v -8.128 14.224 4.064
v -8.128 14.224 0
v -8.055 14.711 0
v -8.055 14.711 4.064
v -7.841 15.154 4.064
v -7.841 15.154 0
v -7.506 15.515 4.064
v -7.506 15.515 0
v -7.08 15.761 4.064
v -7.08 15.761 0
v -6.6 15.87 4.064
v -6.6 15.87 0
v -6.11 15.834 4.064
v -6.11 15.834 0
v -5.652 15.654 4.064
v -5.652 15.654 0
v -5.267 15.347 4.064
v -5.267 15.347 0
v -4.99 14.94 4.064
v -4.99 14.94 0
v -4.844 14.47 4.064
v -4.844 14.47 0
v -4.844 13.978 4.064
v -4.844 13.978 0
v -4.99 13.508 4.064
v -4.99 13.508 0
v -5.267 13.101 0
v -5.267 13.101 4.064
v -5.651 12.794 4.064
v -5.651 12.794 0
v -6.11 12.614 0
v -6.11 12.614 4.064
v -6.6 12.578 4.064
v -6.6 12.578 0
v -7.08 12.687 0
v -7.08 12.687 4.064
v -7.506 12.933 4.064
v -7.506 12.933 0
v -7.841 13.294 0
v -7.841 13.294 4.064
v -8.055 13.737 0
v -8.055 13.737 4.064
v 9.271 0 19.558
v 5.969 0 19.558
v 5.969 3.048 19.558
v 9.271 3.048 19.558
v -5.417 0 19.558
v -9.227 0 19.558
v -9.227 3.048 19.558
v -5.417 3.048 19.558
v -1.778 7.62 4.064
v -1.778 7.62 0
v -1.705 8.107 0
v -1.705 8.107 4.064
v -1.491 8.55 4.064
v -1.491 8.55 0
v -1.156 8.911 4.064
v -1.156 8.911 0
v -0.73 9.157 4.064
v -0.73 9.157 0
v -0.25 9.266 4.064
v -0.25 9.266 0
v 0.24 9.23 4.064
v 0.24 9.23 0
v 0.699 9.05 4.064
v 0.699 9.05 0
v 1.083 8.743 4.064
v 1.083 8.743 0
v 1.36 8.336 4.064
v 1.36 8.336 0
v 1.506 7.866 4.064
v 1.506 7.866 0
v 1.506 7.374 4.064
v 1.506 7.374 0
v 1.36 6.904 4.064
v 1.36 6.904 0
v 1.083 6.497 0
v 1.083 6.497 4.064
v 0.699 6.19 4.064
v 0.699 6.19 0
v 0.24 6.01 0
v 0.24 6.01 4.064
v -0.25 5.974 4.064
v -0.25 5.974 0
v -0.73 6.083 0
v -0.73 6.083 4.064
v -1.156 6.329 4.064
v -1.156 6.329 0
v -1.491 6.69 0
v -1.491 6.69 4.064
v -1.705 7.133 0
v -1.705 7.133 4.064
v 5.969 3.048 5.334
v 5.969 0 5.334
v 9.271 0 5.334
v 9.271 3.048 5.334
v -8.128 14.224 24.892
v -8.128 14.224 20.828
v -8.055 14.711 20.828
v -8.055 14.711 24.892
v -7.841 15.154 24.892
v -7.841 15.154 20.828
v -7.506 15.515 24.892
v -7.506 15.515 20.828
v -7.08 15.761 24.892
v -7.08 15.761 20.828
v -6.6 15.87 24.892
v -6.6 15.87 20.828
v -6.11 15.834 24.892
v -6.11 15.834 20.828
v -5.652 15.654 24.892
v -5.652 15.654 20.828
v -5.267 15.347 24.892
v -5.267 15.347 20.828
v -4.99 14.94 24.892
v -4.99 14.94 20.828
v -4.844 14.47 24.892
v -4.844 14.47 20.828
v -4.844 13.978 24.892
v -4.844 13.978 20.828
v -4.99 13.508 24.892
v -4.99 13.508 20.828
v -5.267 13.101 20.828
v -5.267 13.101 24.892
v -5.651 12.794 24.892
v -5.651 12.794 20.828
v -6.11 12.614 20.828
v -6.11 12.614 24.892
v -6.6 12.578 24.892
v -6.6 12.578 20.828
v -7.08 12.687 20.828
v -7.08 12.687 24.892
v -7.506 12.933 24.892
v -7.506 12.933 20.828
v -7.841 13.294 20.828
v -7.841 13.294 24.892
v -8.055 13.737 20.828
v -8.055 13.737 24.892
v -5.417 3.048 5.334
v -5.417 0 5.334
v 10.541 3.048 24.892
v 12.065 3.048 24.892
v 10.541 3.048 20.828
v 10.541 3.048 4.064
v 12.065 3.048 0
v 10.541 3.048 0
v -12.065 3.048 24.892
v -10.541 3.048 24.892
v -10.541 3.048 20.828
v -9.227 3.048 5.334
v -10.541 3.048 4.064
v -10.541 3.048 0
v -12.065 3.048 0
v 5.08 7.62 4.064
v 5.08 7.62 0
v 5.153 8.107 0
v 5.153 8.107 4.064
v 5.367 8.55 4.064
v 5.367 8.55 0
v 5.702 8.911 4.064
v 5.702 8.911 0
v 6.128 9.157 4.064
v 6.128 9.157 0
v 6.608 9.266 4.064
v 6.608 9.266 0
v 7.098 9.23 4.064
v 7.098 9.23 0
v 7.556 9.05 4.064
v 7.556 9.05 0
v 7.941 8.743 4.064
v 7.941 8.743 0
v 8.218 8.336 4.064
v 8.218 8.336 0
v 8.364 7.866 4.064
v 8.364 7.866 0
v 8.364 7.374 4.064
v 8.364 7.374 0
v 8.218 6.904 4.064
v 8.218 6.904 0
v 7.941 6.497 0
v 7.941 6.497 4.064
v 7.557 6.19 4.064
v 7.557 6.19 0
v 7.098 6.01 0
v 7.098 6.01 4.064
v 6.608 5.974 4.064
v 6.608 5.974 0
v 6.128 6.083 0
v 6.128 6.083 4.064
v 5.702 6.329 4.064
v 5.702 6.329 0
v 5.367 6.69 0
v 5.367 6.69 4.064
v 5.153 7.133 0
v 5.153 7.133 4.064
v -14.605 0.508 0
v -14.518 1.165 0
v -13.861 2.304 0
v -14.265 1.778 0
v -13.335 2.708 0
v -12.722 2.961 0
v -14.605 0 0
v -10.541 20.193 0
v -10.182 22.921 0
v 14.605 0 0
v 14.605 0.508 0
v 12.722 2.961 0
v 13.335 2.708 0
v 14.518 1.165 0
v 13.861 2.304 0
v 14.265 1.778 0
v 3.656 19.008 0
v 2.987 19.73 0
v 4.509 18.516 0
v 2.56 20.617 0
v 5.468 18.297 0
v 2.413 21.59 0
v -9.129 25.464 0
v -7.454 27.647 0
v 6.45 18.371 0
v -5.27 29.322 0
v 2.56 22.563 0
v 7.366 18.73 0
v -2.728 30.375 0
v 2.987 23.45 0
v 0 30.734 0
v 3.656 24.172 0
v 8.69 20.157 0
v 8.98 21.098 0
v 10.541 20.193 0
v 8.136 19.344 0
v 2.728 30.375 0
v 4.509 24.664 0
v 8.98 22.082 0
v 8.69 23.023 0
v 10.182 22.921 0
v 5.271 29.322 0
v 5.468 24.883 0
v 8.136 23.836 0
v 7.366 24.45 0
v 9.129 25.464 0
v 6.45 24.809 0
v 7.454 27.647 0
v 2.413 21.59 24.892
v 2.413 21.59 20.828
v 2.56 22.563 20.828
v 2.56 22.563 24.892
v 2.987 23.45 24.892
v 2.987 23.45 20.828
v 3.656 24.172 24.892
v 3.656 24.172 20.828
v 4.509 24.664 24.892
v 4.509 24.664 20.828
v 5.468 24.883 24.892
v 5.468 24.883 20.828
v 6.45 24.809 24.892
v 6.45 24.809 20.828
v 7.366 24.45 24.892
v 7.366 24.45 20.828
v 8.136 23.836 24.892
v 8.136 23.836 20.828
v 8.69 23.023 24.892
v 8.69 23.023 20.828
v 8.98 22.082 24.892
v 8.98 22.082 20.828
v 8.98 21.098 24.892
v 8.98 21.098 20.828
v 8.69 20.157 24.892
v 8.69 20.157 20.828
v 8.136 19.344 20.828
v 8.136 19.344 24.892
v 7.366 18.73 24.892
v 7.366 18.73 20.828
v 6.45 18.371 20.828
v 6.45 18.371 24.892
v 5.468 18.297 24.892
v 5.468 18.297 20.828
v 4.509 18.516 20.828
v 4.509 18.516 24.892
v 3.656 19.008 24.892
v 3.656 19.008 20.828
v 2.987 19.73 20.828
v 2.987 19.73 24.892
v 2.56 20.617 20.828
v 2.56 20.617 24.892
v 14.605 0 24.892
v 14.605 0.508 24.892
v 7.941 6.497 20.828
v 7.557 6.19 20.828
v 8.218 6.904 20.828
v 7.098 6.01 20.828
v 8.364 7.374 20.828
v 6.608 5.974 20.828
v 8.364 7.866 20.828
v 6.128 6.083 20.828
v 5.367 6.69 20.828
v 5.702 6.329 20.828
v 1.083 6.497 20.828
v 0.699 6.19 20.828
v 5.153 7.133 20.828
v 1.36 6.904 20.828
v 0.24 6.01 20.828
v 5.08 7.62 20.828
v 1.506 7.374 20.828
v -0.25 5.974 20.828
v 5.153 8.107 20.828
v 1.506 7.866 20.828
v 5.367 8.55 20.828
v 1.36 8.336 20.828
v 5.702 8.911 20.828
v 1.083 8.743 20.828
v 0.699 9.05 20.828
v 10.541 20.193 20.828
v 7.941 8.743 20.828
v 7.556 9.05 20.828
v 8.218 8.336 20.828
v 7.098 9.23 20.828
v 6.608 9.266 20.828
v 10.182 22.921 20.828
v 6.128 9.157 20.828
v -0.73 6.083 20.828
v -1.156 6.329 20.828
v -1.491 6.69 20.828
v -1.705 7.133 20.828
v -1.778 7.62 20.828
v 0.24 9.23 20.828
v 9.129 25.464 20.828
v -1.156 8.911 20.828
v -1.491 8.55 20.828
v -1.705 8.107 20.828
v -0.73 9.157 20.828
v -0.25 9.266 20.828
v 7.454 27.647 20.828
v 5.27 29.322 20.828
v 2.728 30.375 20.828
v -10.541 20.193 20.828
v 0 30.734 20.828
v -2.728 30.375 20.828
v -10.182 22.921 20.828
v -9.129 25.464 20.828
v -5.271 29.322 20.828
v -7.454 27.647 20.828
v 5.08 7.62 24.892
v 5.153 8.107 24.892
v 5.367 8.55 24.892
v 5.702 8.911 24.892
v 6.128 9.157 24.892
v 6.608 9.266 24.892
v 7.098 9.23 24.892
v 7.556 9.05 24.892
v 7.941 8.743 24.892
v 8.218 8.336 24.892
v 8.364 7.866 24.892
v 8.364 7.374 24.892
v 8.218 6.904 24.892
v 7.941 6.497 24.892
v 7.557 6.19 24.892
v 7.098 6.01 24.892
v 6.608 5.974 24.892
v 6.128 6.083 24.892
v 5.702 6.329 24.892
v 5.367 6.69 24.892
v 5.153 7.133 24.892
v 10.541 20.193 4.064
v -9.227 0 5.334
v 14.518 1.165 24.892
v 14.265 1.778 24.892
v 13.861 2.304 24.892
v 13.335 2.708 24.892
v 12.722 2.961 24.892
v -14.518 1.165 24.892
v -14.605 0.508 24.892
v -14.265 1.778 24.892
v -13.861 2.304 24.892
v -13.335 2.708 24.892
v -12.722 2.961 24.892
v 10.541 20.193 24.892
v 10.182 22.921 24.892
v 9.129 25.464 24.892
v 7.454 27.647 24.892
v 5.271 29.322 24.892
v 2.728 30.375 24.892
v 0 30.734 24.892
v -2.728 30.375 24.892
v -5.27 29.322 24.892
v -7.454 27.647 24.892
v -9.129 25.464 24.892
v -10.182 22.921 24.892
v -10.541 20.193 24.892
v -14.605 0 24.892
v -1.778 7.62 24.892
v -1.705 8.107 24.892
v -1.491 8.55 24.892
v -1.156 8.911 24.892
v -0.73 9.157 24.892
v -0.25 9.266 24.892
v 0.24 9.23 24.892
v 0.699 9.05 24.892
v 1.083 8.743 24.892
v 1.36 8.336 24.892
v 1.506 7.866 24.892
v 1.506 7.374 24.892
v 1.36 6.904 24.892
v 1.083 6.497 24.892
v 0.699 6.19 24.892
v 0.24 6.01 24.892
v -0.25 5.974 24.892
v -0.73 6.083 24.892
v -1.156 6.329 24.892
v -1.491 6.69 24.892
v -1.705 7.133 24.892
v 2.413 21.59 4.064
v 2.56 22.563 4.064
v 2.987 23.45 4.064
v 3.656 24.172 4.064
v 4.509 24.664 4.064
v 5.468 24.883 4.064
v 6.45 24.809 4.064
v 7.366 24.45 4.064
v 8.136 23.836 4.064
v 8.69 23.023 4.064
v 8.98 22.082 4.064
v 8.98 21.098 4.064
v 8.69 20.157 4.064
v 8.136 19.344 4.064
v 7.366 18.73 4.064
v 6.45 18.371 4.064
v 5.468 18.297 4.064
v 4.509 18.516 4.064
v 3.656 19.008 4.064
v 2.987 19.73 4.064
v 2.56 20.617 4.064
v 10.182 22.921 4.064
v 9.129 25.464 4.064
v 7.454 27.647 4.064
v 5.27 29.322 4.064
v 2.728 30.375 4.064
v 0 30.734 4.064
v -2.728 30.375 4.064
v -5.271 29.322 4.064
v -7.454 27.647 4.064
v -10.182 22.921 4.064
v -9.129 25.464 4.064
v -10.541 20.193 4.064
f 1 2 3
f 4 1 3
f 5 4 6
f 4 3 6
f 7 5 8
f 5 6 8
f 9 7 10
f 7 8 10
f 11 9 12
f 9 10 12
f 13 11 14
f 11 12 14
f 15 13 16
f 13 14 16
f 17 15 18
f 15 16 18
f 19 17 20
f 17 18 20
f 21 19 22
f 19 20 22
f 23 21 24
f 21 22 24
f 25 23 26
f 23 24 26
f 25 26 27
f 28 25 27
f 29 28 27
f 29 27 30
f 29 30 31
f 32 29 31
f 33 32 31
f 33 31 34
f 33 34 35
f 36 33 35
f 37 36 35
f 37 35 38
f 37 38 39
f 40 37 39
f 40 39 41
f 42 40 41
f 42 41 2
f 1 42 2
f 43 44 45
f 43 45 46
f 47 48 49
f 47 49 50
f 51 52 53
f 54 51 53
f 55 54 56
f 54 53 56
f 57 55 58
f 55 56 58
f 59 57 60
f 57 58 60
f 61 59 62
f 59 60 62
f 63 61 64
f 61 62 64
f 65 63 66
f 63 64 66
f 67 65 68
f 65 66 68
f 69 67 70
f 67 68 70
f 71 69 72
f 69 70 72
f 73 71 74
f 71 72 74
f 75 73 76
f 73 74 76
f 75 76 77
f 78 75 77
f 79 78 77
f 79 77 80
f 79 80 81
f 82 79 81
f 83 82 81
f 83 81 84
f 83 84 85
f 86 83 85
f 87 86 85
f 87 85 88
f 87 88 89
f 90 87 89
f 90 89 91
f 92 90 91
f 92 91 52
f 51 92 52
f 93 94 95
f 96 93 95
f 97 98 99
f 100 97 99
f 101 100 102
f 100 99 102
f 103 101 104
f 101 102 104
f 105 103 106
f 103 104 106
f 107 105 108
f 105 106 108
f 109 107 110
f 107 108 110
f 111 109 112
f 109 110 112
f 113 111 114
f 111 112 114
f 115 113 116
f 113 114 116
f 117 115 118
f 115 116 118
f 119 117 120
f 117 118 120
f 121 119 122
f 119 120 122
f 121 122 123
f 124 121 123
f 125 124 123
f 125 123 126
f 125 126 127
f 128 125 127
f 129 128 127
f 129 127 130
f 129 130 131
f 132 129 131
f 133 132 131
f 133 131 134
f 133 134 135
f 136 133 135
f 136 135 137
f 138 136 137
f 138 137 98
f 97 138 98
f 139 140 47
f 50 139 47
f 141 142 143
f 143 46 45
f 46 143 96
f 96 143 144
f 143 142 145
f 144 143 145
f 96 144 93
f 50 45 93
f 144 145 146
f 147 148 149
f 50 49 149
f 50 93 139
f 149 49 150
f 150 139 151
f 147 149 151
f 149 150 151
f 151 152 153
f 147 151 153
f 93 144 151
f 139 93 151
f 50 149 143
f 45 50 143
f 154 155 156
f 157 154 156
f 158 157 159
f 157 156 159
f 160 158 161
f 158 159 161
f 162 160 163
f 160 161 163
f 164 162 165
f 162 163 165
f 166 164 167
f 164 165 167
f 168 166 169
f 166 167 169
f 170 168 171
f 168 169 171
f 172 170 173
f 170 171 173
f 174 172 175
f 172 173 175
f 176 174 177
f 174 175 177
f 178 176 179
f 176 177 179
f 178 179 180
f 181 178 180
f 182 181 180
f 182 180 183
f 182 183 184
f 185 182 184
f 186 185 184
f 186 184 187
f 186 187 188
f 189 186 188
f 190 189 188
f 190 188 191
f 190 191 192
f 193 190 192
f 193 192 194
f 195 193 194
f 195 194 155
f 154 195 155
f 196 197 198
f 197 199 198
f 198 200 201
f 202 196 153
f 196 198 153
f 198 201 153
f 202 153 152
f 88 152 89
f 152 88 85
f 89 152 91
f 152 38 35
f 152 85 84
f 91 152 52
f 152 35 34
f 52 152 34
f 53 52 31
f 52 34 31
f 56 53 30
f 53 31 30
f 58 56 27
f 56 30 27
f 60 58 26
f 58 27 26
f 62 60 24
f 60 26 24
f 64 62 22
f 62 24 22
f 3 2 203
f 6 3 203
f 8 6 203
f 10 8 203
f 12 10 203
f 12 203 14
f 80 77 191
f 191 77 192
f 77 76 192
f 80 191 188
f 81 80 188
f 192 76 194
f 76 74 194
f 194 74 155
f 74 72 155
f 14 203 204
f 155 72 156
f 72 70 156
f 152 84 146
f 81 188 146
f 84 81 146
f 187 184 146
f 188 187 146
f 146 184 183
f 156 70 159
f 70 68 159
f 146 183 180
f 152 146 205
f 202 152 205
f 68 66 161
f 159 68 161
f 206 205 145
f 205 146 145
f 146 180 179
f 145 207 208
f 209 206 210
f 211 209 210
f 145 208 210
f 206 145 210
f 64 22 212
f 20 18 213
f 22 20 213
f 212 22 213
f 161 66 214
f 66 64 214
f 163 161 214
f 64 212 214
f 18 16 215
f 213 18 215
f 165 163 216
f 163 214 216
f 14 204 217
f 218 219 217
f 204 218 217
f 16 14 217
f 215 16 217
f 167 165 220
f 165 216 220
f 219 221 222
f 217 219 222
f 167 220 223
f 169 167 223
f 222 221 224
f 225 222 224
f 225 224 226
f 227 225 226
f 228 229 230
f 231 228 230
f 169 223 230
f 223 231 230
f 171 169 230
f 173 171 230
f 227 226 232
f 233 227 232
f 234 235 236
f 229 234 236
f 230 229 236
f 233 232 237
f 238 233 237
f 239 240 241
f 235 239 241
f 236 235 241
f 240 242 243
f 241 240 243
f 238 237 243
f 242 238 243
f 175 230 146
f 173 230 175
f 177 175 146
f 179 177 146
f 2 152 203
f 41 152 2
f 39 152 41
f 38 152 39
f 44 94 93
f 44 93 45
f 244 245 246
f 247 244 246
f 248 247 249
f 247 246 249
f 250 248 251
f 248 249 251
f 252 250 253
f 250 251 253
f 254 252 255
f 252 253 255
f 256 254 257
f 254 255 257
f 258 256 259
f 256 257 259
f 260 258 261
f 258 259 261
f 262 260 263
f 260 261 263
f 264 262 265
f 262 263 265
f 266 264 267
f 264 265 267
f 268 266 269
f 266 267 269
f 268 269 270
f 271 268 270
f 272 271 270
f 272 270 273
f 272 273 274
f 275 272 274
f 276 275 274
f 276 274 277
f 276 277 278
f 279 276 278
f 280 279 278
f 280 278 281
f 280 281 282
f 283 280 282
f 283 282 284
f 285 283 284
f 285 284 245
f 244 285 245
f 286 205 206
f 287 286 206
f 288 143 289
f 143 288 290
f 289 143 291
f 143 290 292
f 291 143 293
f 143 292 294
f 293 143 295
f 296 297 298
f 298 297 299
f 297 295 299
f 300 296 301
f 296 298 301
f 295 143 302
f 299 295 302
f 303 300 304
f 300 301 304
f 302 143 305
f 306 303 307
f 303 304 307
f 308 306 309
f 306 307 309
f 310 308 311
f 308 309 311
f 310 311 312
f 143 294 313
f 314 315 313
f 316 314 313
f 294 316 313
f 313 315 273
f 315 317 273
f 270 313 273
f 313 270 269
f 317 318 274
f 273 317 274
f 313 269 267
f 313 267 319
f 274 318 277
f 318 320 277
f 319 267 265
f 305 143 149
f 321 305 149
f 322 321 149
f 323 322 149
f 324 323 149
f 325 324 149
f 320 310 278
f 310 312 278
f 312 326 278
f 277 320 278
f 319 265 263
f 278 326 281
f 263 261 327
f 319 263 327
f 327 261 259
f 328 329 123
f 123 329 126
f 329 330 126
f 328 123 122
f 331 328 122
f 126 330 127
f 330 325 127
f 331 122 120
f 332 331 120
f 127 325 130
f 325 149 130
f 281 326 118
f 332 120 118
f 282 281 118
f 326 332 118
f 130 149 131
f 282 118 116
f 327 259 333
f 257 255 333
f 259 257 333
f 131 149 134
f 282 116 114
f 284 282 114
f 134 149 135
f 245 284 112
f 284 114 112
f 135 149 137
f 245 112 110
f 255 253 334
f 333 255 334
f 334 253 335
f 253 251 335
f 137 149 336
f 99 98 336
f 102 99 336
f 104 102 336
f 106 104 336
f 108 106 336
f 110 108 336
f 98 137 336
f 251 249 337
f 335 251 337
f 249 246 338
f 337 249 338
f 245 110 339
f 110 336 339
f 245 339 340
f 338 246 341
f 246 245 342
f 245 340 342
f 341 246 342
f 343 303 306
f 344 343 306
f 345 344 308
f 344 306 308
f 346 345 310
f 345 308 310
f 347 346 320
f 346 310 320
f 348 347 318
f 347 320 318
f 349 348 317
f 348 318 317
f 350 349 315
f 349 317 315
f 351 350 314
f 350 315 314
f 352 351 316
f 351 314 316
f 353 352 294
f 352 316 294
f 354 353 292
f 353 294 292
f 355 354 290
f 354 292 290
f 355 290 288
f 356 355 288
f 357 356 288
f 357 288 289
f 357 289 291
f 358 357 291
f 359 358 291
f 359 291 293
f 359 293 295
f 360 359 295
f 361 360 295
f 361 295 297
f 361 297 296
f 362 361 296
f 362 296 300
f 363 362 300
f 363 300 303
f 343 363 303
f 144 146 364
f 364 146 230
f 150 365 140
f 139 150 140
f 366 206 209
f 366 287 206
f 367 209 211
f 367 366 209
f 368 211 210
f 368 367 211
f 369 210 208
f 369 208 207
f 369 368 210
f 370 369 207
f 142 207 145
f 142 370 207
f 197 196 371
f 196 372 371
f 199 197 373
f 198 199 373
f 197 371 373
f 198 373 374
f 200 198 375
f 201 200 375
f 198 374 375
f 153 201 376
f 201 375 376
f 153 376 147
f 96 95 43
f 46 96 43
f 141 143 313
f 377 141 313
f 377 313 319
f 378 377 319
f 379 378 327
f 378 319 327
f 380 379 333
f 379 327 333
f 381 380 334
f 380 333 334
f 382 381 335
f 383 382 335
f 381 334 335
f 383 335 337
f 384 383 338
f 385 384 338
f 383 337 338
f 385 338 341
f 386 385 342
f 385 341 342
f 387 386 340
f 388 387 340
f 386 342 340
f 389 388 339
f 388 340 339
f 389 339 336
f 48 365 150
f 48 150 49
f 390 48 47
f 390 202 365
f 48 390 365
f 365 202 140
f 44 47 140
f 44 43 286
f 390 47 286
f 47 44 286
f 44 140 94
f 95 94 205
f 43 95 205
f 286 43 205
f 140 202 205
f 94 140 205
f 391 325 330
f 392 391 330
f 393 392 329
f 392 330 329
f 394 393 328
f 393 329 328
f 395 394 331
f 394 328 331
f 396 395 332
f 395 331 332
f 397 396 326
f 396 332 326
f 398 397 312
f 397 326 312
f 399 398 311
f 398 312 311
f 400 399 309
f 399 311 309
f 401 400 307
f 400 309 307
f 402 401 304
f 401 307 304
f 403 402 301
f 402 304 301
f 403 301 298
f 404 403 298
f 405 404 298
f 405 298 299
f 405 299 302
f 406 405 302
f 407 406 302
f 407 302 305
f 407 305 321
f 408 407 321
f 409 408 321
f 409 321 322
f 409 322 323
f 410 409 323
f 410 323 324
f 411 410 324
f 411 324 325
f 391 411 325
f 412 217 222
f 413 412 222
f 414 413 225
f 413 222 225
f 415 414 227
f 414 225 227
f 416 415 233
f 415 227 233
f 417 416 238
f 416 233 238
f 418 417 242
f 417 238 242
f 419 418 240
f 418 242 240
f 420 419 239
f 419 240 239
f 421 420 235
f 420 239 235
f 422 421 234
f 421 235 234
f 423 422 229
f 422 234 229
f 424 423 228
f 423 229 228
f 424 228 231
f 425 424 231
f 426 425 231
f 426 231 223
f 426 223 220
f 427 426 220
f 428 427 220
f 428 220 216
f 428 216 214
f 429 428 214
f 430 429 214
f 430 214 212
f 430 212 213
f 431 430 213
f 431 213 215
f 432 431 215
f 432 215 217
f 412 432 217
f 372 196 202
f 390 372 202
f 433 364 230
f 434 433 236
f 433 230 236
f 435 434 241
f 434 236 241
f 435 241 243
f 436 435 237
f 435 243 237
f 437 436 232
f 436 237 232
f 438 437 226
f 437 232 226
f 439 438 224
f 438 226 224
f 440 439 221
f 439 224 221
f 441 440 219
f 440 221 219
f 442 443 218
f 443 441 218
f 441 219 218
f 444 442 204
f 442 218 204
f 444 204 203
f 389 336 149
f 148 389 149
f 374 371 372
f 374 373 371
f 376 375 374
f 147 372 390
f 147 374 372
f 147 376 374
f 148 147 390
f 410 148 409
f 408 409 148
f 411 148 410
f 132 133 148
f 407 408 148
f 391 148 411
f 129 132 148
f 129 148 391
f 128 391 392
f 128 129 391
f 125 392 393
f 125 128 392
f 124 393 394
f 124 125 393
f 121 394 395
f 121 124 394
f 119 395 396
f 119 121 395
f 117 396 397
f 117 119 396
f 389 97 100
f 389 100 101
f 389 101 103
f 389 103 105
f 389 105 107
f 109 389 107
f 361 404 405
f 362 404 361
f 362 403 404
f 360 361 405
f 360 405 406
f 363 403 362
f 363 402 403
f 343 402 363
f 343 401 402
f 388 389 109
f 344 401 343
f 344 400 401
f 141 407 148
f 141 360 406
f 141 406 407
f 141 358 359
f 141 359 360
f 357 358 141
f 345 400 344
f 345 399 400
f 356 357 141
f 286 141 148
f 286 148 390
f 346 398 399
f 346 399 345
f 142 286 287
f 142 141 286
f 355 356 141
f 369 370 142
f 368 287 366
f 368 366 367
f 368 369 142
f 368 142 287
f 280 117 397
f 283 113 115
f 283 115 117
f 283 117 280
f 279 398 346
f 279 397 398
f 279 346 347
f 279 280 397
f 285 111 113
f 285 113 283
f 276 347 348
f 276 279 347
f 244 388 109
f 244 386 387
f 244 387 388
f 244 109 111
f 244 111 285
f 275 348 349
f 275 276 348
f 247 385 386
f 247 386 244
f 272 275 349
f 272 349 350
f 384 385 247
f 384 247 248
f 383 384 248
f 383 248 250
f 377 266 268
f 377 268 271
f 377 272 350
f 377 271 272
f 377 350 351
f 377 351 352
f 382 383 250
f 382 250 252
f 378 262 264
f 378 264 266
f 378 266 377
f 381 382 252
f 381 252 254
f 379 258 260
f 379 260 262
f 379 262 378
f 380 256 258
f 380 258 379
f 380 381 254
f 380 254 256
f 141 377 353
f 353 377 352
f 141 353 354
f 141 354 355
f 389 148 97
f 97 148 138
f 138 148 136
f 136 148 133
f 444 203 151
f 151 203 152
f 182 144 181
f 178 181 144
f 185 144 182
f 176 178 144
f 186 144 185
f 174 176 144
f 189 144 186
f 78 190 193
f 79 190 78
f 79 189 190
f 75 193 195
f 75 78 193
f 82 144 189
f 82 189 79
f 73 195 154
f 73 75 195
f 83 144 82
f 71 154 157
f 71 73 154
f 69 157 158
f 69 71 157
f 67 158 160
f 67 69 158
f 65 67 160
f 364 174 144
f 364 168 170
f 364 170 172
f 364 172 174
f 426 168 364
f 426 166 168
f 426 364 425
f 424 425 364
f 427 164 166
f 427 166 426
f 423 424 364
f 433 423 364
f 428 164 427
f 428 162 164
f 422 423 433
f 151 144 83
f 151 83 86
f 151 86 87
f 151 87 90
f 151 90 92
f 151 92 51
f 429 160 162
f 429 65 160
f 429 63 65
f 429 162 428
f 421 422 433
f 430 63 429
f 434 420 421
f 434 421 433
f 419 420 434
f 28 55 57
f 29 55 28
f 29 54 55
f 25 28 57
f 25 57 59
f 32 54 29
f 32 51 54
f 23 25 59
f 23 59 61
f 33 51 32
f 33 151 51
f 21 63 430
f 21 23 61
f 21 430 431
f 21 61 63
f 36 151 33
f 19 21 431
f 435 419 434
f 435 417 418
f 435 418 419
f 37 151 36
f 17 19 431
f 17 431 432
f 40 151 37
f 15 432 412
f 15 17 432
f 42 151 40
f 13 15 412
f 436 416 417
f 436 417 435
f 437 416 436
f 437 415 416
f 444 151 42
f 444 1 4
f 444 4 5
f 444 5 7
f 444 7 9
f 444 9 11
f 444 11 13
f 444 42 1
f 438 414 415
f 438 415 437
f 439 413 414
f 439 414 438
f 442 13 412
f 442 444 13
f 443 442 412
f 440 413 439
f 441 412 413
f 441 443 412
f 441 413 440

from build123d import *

# Parameters (mm, degrees)
BOSS_EXTRUDE1_DEPTH = 24.892
CUT_EXTRUDE1_REACH  = 27.146
SKETCH2_W           = 16.764
SKETCH2_H           = 27.686
SKETCH3_R           = 3.302
SKETCH3_R_2         = 1.651
CUT_EXTRUDE2_DEPTH  = 24.892
CUT_EXTRUDE3_REACH  = 32.734
SKETCH4_W           = 3.81
SKETCH4_H           = 14.224
SKETCH4_W_2         = 3.302
FILLET1_R           = 2.54


with BuildPart() as part:
    # Sketch1 → Boss-Extrude1 (new body)
    with BuildSketch(Plane.XY):
        with BuildLine():
            Line((-14.605, 0), (14.605, 0))
            Line((14.605, 0), (14.605, 3.048))
            Line((14.605, 3.048), (10.541, 3.048))
            Line((10.541, 3.048), (10.541, 20.193))
            ThreePointArc((10.541, 20.193), (0, 30.734), (-10.541, 20.193))
            Line((-10.541, 20.193), (-10.541, 3.048))
            Line((-10.541, 3.048), (-14.605, 3.048))
            Line((-14.605, 3.048), (-14.605, 0))
        make_face()
    extrude(amount=BOSS_EXTRUDE1_DEPTH)

    # Sketch2 → Cut-Extrude1 (cut, up to next)
    with BuildSketch(Plane.ZY.offset(10.541), mode=Mode.PRIVATE) as cut_extrude1_sk1:
        with Locations((12.446, 16.891)):
            Rectangle(SKETCH2_W, SKETCH2_H)
    cut_extrude1_tool1 = extrude(cut_extrude1_sk1.sketch, amount=-CUT_EXTRUDE1_REACH, mode=Mode.PRIVATE) & part.part
    add(cut_extrude1_tool1.solids().sort_by_distance((-10.541, 16.891, 12.446))[0], mode=Mode.SUBTRACT)

    # Sketch3 → Cut-Extrude2 (cut)
    with BuildSketch(Plane(origin=(0, 0, 0), x_dir=(-1, 0, 0), z_dir=(0, 0, -1))):
        with Locations((-5.715, 21.59)):
            Circle(SKETCH3_R)
        with Locations((-6.731, 7.62)):
            Circle(SKETCH3_R_2)
        with Locations((0.127, 7.62)):
            Circle(SKETCH3_R_2)
        with Locations((6.477, 14.224)):
            Circle(SKETCH3_R_2)
    extrude(amount=-CUT_EXTRUDE2_DEPTH, mode=Mode.SUBTRACT)

    # Sketch4 → Cut-Extrude3 (cut, up to next)
    with BuildSketch(Plane.XZ, mode=Mode.PRIVATE) as cut_extrude3_sk1:
        with Locations((-7.321818594, 12.446)):
            Rectangle(SKETCH4_W, SKETCH4_H)
    cut_extrude3_tool1 = extrude(cut_extrude3_sk1.sketch, amount=-CUT_EXTRUDE3_REACH, mode=Mode.PRIVATE) & part.part
    add(cut_extrude3_tool1.solids().sort_by_distance((-7.321819, 0, 12.446))[0], mode=Mode.SUBTRACT)
    # Sketch4 → Cut-Extrude3 (cut, up to next)
    with BuildSketch(Plane.XZ, mode=Mode.PRIVATE) as cut_extrude3_sk2:
        with Locations((7.62, 12.446)):
            Rectangle(SKETCH4_W_2, SKETCH4_H)
    cut_extrude3_tool2 = extrude(cut_extrude3_sk2.sketch, amount=-CUT_EXTRUDE3_REACH, mode=Mode.PRIVATE) & part.part
    add(cut_extrude3_tool2.solids().sort_by_distance((7.62, 0, 12.446))[0], mode=Mode.SUBTRACT)

    # Fillet1
    fillet1_edges = [part.edges().sort_by_distance(p)[0] for p in [
        (-14.605, 3.048, 12.446),
        (14.605, 3.048, 12.446),
    ]]
    fillet(fillet1_edges, radius=FILLET1_R)


solid = part.part
